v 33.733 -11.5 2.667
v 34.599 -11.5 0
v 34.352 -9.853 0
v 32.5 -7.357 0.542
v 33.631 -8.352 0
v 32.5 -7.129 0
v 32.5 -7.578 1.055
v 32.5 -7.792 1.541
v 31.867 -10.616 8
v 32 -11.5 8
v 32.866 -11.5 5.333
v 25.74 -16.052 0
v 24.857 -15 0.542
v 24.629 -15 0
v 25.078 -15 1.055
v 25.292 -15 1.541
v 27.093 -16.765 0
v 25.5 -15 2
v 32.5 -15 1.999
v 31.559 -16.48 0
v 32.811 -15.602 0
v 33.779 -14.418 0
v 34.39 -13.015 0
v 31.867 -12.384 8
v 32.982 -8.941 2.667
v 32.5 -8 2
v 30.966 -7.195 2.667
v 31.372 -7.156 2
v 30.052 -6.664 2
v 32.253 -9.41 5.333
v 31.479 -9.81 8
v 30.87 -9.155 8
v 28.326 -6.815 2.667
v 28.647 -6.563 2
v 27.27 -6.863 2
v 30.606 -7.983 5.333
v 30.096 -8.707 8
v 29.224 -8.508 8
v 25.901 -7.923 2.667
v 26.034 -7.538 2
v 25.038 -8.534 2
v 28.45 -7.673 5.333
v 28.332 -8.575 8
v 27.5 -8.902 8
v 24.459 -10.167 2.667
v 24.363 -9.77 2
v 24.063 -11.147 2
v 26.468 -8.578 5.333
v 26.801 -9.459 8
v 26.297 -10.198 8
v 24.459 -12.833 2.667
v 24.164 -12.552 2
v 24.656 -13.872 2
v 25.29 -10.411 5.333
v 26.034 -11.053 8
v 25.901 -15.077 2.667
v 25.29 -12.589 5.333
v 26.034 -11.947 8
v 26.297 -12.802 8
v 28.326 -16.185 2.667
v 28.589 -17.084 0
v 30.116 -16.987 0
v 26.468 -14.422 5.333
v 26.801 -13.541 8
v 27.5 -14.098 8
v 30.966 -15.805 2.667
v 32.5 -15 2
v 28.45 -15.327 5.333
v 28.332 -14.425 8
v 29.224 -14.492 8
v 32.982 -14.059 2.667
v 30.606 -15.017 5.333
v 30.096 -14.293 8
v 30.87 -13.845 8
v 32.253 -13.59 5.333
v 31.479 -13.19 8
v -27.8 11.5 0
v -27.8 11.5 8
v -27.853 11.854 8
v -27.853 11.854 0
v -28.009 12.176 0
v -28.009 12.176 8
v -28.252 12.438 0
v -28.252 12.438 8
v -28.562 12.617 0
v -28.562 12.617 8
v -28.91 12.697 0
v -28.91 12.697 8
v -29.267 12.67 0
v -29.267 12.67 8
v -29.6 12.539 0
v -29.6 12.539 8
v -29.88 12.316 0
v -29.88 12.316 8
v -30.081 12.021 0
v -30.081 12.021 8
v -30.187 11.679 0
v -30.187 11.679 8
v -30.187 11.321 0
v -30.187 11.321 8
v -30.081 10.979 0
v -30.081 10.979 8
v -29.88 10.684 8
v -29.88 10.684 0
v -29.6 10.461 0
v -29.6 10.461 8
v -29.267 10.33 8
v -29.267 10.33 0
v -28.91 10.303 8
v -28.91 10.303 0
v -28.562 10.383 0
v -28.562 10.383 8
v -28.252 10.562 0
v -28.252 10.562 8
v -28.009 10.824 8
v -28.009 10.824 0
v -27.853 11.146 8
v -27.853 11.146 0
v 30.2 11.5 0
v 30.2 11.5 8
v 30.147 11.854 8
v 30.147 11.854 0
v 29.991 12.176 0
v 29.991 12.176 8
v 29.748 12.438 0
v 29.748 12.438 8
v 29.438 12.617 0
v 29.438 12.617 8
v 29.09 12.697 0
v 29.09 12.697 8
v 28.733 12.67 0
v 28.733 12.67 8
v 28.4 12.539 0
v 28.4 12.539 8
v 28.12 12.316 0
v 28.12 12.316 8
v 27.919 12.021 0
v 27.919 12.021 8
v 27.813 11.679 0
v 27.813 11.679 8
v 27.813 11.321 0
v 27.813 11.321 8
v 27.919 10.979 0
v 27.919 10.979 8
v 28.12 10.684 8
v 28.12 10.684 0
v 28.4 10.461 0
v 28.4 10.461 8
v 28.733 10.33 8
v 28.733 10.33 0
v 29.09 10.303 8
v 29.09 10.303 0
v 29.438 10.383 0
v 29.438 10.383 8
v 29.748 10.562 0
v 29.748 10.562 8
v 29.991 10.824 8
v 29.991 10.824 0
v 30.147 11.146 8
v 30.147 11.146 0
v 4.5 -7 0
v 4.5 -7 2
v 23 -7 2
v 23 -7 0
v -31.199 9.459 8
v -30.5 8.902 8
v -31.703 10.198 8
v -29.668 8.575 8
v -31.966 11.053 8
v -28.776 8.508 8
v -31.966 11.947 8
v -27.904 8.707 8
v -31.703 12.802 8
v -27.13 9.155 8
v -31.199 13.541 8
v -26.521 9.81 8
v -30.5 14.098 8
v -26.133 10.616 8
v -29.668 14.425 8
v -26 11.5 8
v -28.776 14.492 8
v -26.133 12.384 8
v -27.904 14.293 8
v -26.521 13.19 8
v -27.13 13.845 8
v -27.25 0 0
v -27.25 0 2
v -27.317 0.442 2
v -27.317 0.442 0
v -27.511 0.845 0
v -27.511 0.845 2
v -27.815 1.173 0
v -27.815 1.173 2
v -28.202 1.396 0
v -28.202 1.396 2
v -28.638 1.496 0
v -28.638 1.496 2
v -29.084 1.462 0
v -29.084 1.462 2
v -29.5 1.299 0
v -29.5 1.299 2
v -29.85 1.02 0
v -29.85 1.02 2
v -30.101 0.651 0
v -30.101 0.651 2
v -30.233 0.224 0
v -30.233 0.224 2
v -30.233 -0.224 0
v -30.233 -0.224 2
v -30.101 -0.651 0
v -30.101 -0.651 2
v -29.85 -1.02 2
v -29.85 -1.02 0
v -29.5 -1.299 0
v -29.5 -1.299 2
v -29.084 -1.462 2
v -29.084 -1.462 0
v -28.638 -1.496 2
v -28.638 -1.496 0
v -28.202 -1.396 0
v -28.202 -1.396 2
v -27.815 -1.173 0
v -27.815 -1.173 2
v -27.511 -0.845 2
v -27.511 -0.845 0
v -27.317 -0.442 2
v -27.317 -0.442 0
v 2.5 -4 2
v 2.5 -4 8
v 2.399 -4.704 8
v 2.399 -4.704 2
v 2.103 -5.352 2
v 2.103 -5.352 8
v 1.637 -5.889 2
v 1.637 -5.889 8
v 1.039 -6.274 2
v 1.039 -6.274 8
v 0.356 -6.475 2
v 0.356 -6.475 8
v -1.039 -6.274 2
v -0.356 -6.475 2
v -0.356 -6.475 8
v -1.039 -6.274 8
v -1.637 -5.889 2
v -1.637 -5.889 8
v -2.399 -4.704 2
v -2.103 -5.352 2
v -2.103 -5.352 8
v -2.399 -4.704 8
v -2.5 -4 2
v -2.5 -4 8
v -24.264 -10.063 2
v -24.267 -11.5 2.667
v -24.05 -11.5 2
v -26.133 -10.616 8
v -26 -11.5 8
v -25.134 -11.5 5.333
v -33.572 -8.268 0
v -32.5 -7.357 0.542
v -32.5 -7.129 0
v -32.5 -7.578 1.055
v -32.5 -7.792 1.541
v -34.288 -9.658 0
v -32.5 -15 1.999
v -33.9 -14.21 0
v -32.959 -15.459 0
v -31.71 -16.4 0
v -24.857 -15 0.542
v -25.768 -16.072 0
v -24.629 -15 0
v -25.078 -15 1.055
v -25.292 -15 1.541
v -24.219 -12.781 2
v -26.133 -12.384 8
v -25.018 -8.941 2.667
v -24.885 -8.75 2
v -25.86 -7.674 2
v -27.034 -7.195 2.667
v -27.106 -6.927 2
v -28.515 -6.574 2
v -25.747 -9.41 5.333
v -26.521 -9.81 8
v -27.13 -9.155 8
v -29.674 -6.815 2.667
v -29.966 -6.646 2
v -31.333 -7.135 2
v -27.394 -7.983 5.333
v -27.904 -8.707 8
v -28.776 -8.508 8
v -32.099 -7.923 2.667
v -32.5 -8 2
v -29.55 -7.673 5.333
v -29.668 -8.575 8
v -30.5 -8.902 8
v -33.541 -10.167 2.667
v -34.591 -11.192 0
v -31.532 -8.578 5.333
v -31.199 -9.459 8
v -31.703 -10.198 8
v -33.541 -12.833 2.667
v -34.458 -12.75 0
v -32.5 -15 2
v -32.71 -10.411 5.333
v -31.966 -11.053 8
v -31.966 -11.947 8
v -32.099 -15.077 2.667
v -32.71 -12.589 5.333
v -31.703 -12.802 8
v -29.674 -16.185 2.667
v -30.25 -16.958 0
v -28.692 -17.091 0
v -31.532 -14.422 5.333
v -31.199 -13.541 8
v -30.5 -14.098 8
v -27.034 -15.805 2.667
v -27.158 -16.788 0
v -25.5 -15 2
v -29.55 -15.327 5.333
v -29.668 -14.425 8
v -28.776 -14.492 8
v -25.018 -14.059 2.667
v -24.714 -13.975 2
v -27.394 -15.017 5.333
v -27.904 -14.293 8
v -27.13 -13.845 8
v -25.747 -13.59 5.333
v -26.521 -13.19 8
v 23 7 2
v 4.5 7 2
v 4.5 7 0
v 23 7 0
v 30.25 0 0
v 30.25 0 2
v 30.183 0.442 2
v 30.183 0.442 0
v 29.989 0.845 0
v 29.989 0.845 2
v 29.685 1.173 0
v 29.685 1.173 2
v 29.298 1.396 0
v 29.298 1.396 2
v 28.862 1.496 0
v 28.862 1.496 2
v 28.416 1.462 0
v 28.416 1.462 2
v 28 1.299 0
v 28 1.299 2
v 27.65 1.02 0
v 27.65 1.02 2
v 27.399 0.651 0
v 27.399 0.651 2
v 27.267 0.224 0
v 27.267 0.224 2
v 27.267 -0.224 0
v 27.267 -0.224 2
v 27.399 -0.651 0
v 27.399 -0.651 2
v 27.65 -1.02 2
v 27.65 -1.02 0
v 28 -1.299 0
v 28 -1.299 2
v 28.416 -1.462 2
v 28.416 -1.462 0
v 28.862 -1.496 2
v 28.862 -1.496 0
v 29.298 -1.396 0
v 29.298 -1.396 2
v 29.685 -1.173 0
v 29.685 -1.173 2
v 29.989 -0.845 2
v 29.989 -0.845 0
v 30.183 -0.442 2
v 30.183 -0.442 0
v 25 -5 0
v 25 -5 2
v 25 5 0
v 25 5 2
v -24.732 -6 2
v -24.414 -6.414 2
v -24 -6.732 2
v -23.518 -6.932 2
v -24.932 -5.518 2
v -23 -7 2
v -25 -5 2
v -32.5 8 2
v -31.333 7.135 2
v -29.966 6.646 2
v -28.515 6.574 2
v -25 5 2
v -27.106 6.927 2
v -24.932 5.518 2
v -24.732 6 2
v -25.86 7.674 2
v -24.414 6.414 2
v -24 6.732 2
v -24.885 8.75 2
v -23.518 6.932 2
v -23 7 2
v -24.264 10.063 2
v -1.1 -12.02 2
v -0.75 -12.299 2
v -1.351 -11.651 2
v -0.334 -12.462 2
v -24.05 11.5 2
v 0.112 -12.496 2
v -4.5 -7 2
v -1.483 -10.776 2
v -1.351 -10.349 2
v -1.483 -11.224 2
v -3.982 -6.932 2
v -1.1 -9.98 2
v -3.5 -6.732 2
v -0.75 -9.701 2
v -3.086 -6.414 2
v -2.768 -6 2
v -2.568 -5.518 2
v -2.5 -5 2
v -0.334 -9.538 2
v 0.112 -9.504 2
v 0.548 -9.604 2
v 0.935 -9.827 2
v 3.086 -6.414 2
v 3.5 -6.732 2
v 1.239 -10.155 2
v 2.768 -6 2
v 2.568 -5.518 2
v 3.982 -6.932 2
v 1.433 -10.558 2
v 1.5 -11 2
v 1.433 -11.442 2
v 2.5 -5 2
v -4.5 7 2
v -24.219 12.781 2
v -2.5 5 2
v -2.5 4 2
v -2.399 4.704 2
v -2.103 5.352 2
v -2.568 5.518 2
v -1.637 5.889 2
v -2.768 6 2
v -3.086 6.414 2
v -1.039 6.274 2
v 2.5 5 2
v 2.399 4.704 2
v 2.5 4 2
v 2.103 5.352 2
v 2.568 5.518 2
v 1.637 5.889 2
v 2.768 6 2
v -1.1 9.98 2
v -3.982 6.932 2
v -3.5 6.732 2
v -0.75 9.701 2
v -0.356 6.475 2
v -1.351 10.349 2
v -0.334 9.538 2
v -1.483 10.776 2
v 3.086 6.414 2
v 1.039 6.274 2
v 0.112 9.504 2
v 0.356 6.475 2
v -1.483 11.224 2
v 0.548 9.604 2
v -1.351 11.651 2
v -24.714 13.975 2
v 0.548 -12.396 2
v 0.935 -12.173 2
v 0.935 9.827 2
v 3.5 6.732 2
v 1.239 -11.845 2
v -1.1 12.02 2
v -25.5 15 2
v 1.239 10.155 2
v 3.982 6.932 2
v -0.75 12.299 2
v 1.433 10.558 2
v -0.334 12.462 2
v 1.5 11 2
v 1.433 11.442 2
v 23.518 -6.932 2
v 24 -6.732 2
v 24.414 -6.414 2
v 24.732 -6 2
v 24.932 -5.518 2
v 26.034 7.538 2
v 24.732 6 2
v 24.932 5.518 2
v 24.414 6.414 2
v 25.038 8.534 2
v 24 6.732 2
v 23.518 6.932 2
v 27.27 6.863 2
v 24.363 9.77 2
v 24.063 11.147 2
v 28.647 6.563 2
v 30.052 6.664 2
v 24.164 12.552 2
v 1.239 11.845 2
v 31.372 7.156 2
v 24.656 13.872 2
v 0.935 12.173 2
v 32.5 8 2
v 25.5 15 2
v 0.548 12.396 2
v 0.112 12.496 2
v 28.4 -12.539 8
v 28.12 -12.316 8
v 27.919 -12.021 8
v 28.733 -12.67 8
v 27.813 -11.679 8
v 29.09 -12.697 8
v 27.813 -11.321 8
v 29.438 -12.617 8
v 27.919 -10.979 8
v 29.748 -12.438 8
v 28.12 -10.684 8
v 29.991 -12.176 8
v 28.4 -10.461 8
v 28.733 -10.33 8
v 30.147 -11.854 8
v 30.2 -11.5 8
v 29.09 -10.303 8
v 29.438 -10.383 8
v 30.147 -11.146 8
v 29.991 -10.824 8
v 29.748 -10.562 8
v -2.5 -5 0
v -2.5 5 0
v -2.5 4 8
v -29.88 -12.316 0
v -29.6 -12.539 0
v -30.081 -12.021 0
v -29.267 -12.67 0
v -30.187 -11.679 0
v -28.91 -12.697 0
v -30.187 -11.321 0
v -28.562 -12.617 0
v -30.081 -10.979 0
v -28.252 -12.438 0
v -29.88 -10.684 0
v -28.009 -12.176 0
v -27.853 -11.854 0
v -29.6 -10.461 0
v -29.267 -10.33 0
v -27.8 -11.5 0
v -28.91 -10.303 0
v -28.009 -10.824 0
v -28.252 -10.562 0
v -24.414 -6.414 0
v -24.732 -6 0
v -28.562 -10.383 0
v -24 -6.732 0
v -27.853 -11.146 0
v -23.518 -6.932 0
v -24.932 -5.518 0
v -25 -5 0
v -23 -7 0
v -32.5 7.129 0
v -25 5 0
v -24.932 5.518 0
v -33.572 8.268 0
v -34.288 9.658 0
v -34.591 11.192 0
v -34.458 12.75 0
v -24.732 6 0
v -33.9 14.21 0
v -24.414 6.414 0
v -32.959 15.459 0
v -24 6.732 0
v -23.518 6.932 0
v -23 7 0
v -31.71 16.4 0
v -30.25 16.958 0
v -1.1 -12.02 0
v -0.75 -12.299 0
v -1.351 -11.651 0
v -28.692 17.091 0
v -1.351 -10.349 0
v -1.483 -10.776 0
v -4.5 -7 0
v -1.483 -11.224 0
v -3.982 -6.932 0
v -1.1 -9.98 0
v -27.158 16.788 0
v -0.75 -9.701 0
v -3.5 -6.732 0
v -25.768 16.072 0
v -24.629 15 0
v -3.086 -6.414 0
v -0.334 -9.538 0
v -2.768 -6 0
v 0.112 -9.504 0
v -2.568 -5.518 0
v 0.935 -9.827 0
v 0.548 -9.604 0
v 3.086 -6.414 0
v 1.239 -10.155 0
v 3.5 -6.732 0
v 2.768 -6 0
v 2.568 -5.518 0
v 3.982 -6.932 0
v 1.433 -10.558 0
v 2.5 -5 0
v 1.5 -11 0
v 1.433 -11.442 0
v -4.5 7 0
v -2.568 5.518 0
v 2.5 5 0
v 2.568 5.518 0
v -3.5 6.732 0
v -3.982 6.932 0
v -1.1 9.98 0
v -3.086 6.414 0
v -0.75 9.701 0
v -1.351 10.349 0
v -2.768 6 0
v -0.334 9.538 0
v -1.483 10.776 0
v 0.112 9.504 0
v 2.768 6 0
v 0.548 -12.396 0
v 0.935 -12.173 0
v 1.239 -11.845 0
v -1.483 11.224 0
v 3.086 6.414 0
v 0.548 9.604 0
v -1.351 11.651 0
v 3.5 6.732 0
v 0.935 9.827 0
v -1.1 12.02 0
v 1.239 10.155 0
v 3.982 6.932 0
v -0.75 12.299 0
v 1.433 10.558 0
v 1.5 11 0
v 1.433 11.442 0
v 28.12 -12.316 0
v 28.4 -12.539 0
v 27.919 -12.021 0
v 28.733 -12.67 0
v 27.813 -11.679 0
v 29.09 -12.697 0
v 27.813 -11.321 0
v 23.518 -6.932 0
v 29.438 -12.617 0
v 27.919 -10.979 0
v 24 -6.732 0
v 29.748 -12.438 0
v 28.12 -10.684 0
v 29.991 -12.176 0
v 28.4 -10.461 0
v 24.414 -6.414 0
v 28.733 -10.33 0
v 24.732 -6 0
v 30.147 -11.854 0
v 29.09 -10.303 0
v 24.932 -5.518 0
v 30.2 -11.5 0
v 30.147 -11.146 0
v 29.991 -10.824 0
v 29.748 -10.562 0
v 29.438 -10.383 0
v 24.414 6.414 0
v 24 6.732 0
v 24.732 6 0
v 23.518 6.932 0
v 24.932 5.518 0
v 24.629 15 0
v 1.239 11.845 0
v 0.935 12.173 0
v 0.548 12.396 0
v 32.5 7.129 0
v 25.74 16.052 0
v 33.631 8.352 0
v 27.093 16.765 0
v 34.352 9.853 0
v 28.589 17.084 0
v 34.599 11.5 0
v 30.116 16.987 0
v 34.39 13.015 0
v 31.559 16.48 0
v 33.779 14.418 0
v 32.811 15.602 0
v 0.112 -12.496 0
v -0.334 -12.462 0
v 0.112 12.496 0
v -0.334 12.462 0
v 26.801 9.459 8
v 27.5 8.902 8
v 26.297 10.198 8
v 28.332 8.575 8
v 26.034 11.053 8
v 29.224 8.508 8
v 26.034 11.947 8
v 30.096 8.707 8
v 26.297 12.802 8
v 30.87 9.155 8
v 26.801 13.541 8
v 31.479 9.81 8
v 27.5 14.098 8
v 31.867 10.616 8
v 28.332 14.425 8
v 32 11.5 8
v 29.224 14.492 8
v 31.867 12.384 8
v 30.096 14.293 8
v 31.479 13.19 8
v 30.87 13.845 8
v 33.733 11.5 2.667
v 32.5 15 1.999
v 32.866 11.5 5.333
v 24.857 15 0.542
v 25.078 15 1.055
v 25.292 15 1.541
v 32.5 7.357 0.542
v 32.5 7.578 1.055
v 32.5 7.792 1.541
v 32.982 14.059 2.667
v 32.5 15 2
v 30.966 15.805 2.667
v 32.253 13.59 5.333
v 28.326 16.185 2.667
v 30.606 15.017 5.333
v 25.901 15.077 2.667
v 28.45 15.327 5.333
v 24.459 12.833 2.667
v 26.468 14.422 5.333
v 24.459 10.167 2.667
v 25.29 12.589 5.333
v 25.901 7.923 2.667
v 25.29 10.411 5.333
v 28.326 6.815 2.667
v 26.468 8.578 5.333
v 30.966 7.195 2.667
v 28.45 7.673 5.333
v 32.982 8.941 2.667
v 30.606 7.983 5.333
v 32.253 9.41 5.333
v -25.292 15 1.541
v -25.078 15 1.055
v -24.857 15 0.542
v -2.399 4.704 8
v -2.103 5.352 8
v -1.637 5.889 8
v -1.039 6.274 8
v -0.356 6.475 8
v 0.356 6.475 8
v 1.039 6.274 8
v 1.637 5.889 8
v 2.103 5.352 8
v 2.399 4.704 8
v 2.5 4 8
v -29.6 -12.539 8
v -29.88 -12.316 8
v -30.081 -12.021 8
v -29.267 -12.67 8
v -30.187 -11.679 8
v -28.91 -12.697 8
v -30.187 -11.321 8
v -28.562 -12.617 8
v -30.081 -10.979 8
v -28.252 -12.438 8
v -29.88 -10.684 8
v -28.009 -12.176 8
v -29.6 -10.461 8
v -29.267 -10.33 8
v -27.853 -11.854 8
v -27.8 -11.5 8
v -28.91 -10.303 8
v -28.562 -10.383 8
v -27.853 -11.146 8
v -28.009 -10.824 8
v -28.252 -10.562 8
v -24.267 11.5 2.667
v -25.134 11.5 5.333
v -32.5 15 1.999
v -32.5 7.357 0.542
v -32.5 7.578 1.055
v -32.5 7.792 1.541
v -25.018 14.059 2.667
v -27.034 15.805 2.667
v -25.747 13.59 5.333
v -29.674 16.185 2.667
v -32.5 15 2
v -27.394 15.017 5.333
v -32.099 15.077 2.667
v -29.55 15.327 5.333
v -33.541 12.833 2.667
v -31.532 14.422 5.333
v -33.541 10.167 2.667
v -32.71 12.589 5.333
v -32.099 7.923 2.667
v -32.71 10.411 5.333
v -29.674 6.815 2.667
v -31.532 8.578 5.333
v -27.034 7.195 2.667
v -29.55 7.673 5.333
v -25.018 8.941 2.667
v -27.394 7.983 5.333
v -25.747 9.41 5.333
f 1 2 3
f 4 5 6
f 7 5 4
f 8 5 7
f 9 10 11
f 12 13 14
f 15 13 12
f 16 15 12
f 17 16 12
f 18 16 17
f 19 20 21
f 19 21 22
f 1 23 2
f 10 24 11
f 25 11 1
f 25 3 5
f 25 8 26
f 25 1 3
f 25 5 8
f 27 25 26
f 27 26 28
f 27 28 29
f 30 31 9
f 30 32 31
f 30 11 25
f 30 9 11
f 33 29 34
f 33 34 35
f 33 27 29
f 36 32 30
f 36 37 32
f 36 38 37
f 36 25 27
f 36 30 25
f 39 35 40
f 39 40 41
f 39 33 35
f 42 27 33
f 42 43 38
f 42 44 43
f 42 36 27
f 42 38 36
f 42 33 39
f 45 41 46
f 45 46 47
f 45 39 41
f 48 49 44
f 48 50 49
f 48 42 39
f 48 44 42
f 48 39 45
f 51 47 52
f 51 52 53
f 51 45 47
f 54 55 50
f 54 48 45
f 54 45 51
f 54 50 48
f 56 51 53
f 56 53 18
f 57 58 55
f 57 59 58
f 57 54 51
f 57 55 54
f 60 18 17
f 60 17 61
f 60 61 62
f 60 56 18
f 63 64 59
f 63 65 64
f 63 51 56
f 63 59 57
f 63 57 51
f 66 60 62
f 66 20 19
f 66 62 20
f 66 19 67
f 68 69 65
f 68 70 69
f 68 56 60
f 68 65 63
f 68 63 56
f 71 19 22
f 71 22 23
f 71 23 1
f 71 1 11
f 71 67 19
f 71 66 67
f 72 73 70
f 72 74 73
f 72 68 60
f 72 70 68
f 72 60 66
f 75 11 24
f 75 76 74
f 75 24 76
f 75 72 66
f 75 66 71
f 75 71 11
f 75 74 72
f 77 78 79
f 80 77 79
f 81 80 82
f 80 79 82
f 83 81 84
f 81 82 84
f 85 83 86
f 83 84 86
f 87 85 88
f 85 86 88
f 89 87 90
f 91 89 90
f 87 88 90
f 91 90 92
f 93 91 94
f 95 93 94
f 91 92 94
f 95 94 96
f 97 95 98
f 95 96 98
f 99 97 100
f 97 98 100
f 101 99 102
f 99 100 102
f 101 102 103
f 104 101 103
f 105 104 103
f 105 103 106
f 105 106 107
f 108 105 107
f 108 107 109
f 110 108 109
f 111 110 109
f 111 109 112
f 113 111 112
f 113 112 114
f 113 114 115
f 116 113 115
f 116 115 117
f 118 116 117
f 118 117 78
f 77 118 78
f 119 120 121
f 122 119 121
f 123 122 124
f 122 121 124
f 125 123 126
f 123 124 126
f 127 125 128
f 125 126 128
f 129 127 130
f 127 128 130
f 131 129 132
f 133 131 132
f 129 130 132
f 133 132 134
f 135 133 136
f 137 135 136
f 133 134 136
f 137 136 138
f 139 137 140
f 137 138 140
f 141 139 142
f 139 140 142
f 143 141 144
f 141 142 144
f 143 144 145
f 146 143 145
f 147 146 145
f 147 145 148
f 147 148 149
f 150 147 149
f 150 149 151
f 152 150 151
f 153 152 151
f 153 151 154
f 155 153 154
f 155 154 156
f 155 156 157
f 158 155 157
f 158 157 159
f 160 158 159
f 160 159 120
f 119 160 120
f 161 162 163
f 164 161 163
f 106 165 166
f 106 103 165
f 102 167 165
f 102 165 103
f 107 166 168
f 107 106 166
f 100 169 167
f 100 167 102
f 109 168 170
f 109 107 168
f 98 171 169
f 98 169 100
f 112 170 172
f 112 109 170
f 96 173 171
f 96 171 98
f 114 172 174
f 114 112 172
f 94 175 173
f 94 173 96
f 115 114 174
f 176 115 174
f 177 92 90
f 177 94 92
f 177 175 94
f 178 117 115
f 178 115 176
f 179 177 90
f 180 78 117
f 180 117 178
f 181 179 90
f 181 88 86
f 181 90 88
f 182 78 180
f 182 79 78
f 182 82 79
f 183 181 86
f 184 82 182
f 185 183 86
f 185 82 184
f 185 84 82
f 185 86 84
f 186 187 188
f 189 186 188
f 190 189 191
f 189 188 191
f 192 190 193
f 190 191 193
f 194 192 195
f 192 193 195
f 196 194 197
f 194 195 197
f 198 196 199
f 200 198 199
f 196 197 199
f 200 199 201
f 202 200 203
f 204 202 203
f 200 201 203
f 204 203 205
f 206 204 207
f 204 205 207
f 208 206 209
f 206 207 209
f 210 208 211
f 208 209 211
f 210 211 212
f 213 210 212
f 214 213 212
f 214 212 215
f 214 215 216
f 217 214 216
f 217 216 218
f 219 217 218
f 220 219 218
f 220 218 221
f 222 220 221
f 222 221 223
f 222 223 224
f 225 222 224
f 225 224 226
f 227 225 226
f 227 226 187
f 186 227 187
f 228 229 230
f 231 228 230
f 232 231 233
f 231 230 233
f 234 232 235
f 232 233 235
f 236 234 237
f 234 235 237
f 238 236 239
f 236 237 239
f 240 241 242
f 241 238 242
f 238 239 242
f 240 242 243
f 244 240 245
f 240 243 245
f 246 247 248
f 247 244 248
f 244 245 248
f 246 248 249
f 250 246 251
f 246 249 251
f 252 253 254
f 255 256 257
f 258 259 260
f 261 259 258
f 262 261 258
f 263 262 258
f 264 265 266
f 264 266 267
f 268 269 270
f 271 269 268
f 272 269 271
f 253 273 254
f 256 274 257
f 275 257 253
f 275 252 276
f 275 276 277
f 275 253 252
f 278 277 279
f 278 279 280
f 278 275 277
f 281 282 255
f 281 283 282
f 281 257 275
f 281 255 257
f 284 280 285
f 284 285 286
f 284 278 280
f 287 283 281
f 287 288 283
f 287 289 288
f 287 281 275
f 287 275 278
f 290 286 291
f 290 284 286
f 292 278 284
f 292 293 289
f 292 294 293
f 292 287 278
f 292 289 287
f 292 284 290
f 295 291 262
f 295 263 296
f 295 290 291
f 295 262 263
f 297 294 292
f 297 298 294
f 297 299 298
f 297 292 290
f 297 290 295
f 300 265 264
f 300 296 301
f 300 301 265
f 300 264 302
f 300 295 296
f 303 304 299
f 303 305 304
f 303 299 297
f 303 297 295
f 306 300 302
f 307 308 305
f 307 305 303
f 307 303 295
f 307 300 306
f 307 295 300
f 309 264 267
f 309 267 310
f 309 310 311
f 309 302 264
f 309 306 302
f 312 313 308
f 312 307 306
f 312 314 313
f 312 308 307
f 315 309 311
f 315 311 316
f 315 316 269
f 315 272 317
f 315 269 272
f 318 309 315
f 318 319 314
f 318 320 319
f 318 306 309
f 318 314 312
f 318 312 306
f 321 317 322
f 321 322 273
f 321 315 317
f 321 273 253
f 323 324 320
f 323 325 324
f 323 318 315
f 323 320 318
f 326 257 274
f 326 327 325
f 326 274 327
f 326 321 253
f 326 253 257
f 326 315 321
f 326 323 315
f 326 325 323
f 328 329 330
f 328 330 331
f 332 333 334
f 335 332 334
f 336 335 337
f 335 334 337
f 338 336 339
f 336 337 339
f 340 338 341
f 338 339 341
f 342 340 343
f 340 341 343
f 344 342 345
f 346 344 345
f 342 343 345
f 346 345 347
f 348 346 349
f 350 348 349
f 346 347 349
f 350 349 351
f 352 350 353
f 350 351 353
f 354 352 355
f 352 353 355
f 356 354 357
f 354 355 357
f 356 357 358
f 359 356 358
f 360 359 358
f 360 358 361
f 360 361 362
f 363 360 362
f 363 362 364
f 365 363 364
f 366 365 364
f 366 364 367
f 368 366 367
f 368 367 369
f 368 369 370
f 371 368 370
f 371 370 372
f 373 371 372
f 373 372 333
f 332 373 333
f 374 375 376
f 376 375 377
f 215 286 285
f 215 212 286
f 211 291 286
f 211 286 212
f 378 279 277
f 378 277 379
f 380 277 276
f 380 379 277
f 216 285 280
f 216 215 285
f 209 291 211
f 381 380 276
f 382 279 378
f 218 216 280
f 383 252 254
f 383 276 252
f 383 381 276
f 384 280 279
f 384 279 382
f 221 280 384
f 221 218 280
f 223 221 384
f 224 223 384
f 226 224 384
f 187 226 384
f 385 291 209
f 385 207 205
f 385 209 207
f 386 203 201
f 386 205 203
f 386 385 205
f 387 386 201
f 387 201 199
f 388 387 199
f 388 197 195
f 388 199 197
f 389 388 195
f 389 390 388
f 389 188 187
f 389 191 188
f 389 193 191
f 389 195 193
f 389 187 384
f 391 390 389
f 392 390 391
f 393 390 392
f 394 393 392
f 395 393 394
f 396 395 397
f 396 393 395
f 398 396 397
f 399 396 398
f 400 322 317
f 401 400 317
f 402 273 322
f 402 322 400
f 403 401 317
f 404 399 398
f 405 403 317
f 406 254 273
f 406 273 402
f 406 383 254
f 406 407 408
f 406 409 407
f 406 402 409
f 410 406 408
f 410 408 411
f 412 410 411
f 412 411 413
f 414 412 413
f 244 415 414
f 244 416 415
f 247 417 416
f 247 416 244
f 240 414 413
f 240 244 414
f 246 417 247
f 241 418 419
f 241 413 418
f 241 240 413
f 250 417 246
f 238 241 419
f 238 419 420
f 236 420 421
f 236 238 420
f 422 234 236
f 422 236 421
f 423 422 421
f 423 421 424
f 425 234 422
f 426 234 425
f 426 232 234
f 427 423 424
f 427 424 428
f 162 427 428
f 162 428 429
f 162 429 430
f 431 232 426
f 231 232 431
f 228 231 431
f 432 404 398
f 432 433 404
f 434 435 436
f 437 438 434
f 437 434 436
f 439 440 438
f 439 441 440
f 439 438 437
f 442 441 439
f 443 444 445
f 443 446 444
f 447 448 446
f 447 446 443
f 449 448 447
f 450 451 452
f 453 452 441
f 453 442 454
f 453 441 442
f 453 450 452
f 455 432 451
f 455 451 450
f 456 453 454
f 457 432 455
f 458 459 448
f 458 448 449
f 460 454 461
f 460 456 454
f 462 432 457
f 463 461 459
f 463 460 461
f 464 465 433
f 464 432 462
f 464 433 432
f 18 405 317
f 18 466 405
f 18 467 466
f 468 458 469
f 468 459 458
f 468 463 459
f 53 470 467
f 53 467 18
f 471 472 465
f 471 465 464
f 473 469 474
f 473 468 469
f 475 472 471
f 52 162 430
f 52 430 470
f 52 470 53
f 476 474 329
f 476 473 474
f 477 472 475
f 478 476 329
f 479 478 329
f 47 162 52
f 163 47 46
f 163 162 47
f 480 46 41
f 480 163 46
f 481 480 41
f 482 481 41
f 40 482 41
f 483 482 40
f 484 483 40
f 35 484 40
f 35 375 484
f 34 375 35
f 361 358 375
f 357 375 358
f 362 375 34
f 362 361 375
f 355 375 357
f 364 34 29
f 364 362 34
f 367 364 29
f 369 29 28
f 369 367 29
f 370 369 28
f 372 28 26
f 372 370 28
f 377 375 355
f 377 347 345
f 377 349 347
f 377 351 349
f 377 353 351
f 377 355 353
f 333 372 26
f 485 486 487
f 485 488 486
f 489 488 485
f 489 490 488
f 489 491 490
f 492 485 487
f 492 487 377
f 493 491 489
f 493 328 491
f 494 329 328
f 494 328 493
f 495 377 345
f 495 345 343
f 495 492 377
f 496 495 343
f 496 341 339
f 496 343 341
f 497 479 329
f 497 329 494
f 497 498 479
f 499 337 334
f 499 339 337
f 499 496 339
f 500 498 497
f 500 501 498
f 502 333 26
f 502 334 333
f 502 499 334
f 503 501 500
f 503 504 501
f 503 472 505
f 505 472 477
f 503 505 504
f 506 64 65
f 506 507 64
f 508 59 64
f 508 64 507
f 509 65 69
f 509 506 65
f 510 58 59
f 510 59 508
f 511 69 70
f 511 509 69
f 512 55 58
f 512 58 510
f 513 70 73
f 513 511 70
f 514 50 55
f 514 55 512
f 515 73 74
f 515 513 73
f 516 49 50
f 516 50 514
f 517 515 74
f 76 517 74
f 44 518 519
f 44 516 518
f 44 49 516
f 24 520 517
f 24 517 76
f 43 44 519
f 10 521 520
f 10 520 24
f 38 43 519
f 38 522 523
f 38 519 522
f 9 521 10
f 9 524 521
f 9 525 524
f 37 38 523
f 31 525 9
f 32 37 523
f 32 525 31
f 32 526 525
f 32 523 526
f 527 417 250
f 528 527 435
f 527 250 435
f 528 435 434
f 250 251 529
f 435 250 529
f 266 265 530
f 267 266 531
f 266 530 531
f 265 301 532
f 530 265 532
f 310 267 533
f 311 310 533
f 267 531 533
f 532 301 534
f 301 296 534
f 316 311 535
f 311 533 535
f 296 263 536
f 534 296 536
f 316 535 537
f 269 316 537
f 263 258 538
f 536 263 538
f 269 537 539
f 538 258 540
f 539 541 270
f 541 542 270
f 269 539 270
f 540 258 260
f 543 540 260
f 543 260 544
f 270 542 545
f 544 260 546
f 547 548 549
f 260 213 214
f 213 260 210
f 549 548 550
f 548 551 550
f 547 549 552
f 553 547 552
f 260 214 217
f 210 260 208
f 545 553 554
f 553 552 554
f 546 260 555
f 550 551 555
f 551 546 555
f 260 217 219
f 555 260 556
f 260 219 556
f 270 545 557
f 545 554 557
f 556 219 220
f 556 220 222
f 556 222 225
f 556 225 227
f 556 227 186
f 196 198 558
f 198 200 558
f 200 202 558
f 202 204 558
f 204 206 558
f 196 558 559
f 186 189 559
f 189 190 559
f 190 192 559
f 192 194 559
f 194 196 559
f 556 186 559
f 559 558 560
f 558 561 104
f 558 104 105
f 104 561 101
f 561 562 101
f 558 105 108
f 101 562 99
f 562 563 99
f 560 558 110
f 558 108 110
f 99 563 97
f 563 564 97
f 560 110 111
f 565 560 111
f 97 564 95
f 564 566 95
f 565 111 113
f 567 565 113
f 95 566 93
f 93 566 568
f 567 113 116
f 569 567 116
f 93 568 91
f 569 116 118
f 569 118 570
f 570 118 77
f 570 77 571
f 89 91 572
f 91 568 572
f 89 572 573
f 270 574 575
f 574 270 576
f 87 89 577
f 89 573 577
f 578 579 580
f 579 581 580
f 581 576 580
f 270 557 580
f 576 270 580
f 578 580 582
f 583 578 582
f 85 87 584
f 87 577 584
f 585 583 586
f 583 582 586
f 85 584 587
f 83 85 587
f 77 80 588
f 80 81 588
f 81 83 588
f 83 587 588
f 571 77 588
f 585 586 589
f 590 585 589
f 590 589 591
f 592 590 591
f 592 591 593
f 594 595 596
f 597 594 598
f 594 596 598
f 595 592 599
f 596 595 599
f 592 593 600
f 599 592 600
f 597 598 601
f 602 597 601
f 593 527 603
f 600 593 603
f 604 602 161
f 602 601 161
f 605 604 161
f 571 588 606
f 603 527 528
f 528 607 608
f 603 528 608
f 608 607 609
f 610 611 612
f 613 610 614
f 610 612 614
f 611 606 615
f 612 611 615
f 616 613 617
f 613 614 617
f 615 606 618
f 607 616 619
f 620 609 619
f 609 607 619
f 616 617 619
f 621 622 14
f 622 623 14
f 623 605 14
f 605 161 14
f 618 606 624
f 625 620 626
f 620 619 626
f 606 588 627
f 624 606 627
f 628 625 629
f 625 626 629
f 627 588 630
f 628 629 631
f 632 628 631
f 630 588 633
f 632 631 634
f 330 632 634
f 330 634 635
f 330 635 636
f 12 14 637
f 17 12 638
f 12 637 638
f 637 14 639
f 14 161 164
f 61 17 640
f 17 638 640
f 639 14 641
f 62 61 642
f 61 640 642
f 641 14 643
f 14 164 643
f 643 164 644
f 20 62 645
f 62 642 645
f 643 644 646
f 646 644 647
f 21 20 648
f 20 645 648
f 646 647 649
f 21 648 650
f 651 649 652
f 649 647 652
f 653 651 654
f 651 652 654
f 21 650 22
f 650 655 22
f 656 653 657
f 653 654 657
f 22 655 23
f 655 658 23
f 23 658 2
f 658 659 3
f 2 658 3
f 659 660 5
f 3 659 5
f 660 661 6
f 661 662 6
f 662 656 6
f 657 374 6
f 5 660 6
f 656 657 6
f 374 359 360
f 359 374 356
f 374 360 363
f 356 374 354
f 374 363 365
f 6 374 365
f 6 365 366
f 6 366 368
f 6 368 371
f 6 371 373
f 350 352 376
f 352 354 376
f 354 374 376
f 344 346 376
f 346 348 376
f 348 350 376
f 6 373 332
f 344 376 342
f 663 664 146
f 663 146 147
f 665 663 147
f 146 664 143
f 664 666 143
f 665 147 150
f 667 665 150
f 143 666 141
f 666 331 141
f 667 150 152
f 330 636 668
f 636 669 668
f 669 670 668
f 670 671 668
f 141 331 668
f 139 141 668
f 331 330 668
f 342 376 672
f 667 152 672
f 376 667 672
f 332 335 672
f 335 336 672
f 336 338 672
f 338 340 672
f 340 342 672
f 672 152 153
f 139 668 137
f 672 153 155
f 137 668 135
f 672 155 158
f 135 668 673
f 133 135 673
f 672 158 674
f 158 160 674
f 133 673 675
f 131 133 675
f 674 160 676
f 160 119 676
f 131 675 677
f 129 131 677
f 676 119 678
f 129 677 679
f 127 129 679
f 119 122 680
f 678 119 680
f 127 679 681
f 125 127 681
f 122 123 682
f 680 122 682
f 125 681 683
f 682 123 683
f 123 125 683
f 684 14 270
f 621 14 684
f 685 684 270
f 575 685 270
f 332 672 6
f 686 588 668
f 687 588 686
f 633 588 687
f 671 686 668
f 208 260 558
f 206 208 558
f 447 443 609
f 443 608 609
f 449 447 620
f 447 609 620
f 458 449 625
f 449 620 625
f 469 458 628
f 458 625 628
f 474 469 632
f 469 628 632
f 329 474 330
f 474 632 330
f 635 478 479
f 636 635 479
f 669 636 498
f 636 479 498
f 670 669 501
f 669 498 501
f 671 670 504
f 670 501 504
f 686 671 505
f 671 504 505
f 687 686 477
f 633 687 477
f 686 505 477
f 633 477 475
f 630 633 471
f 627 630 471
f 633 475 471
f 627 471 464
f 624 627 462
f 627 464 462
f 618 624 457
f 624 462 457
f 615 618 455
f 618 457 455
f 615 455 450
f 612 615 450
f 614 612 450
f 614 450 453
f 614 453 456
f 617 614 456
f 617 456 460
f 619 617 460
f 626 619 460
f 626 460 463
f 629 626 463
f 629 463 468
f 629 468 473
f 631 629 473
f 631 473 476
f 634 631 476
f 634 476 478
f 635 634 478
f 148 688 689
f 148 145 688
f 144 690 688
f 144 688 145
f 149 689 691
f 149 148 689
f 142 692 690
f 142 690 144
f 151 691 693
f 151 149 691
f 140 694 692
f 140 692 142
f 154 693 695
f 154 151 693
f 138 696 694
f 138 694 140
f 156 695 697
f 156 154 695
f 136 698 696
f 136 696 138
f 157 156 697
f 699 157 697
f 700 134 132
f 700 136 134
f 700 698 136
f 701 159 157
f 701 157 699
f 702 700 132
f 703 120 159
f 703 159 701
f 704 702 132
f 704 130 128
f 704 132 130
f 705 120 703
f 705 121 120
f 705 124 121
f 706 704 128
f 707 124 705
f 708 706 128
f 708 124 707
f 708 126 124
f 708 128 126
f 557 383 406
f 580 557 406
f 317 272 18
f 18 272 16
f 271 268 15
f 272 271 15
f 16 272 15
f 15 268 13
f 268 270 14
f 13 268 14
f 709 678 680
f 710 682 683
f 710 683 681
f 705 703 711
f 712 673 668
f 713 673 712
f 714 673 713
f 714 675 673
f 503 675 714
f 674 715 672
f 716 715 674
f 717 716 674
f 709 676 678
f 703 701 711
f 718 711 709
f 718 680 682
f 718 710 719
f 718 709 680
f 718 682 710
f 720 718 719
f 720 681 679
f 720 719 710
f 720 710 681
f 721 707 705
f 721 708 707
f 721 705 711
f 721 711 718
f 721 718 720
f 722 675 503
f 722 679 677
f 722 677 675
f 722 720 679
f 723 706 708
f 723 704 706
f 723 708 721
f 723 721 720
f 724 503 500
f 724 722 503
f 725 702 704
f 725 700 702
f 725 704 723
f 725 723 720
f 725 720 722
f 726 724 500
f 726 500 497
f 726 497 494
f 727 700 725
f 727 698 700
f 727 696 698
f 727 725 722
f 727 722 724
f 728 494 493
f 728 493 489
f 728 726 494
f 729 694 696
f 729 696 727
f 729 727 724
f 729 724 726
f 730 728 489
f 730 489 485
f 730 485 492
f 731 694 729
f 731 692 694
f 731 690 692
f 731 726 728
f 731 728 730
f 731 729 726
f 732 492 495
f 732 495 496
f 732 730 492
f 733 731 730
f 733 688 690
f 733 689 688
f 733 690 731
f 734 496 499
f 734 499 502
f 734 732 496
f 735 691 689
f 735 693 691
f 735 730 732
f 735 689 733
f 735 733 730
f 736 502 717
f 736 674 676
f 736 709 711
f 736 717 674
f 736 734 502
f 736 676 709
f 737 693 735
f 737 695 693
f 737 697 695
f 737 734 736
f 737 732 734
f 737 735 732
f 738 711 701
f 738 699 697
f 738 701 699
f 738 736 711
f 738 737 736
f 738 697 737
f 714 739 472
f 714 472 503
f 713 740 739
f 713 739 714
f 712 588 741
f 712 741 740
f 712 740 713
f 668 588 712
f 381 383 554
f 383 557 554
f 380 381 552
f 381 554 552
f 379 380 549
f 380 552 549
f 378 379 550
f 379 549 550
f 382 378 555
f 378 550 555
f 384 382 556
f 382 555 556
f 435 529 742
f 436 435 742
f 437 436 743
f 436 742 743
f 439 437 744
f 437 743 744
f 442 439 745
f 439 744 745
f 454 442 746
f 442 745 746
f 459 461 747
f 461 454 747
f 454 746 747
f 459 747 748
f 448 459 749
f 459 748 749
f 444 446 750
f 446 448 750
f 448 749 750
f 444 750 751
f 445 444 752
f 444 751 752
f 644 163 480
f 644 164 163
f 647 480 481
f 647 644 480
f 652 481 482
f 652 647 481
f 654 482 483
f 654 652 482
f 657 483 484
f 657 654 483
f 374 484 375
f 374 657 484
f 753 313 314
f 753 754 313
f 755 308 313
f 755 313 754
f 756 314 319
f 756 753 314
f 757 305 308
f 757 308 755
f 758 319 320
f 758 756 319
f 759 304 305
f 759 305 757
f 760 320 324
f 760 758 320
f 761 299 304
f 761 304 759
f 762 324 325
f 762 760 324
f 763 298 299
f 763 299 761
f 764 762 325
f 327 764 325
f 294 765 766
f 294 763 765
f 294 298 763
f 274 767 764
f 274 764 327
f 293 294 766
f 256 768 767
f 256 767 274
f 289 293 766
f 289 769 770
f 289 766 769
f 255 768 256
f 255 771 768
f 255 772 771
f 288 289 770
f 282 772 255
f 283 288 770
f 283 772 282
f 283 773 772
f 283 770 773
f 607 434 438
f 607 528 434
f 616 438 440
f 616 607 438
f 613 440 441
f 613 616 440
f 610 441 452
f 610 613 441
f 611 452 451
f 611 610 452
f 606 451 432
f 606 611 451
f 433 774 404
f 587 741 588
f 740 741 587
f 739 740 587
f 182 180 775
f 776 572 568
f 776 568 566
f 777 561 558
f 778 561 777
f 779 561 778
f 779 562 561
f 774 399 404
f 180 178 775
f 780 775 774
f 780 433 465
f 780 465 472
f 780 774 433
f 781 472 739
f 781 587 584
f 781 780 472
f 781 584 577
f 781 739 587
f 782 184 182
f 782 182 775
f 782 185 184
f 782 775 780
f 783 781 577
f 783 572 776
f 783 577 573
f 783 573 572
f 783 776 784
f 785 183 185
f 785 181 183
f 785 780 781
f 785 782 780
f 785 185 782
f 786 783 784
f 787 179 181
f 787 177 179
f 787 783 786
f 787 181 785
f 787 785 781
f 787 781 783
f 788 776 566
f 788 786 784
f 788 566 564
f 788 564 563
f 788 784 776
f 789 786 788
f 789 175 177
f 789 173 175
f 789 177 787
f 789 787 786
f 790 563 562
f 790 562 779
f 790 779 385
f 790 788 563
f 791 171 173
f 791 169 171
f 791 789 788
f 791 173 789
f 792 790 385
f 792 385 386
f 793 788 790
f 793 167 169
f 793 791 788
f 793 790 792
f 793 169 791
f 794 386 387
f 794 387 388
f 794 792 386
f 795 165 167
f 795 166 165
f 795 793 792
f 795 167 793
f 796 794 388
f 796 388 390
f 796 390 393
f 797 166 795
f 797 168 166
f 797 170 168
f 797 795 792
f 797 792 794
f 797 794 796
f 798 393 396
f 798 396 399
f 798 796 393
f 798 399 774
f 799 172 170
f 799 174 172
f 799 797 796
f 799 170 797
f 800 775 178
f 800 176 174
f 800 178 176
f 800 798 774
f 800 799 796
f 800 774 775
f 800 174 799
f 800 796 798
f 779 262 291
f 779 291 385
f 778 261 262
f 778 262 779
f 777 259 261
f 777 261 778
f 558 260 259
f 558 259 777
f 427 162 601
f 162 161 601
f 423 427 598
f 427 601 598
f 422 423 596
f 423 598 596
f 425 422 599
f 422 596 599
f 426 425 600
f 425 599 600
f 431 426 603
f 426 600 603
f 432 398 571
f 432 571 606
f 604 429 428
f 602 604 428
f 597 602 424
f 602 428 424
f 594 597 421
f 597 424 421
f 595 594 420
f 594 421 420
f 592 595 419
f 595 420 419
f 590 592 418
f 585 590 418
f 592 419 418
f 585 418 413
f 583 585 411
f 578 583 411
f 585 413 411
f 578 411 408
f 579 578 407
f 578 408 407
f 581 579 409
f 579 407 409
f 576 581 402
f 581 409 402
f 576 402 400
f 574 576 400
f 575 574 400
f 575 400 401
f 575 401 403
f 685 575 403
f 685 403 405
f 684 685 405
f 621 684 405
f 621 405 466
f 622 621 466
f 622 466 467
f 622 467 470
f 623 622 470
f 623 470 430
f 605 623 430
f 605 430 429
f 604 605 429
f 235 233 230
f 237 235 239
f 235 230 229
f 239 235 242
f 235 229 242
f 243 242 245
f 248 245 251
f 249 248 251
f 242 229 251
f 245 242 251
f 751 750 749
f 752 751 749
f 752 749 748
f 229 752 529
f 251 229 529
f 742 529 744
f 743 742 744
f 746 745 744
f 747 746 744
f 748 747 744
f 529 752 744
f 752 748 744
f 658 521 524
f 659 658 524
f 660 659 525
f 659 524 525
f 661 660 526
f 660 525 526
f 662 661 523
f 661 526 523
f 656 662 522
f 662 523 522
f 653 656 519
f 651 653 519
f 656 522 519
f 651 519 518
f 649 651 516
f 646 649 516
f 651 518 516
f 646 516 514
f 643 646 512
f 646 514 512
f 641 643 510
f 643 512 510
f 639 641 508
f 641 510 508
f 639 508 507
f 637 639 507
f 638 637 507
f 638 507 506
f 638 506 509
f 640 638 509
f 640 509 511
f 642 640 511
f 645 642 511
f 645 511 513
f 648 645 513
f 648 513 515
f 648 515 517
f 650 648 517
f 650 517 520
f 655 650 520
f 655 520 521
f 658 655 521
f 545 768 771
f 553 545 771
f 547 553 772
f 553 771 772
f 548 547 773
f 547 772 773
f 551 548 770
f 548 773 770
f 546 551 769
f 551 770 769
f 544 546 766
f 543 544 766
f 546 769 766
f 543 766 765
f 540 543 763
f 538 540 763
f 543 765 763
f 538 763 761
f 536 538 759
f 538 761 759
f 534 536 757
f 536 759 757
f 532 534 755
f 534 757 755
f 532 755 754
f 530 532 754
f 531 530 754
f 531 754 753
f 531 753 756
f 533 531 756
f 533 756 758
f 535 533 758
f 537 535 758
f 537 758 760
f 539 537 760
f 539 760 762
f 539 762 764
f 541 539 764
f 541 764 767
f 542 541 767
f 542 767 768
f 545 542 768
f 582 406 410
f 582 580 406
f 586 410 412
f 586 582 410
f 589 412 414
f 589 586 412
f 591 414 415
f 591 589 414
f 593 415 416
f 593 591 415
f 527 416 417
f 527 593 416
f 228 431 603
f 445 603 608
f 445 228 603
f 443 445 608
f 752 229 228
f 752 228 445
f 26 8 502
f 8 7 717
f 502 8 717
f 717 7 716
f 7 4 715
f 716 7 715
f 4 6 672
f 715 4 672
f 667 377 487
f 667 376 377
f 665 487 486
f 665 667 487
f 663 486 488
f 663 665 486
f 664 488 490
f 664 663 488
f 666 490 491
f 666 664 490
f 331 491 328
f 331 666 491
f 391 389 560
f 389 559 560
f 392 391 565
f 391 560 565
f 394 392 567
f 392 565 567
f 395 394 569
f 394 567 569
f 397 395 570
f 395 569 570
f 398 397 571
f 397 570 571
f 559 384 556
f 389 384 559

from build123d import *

# Parameters (mm, degrees)
ESQUISSE1_W                  = 65
ESQUISSE1_H                  = 30
BOSS_EXTRU_1_DEPTH           = 2
ESQUISSE2_R                  = 3
BOSS_EXTRU_2_DEPTH           = 8
BOSS_EXTRU_2_DRAFT           = 18
BOSS_EXTRU_2_PROFILE_2_DEPTH = 8
BOSS_EXTRU_2_PROFILE_2_DRAFT = 18
BOSS_EXTRU_2_PROFILE_3_DEPTH = 8
BOSS_EXTRU_2_PROFILE_3_DRAFT = 18
BOSS_EXTRU_2_PROFILE_4_DEPTH = 8
BOSS_EXTRU_2_PROFILE_4_DRAFT = 18
ENL_V_MAT_EXTRU_2_REACH      = 41.058
ESQUISSE4_W                  = 22.5
ESQUISSE4_H                  = 14
ENL_V_MAT_EXTRU_3_REACH      = 41.058
ESQUISSE5_R                  = 1.5
CONG_1_R                     = 2
BOSS_EXTRU_3_REACH           = 41.415
ENL_V_MAT_EXTRU_4_REACH      = 41.415
ESQUISSE7_R                  = 1.2


with BuildPart() as part:
    # Esquisse1 → Boss.-Extru.1 (new body)
    with BuildSketch(Plane.XY):
        Rectangle(ESQUISSE1_W, ESQUISSE1_H)
    extrude(amount=BOSS_EXTRU_1_DEPTH)


with BuildPart() as boss_extru_2_tool:
    # Esquisse2 → Boss.-Extru.2 (with draft: the straight prism first)
    with BuildSketch(Plane.XY.offset(8)):
        with Locations((-29, 11.5)):
            Circle(ESQUISSE2_R)
    extrude(amount=-BOSS_EXTRU_2_DEPTH)
    # Boss.-Extru.2: the draft: its side faces are tilted about the plane it starts from
    boss_extru_2_sides = [boss_extru_2_tool.faces().sort_by_distance(p)[0] for p in [
        (-32, 11.5, 4),
    ]]
    draft(boss_extru_2_sides, Plane.XY.offset(8), BOSS_EXTRU_2_DRAFT)


with BuildPart() as part_1:
    add(part.part)

    # Boss.-Extru.2: add boss_extru_2_tool
    add(boss_extru_2_tool.part)


with BuildPart() as boss_extru_2_profile_2_tool:
    # Esquisse2 → Boss.-Extru.2 profile 2 (with draft: the straight prism first)
    with BuildSketch(Plane.XY.offset(8)):
        with Locations((29, 11.5)):
            Circle(ESQUISSE2_R)
    extrude(amount=-BOSS_EXTRU_2_PROFILE_2_DEPTH)
    # Boss.-Extru.2 profile 2: the draft: its side faces are tilted about the plane it starts from
    boss_extru_2_profile_2_sides = [boss_extru_2_profile_2_tool.faces().sort_by_distance(p)[0] for p in [
        (26, 11.5, 4),
    ]]
    draft(boss_extru_2_profile_2_sides, Plane.XY.offset(8), BOSS_EXTRU_2_PROFILE_2_DRAFT)


with BuildPart() as part_2:
    add(part_1.part)

    # Boss.-Extru.2 profile 2: add boss_extru_2_profile_2_tool
    add(boss_extru_2_profile_2_tool.part)


with BuildPart() as boss_extru_2_profile_3_tool:
    # Esquisse2 → Boss.-Extru.2 profile 3 (with draft: the straight prism first)
    with BuildSketch(Plane.XY.offset(8)):
        with Locations((29, -11.5)):
            Circle(ESQUISSE2_R)
    extrude(amount=-BOSS_EXTRU_2_PROFILE_3_DEPTH)
    # Boss.-Extru.2 profile 3: the draft: its side faces are tilted about the plane it starts from
    boss_extru_2_profile_3_sides = [boss_extru_2_profile_3_tool.faces().sort_by_distance(p)[0] for p in [
        (26, -11.5, 4),
    ]]
    draft(boss_extru_2_profile_3_sides, Plane.XY.offset(8), BOSS_EXTRU_2_PROFILE_3_DRAFT)


with BuildPart() as part_3:
    add(part_2.part)

    # Boss.-Extru.2 profile 3: add boss_extru_2_profile_3_tool
    add(boss_extru_2_profile_3_tool.part)


with BuildPart() as boss_extru_2_profile_4_tool:
    # Esquisse2 → Boss.-Extru.2 profile 4 (with draft: the straight prism first)
    with BuildSketch(Plane.XY.offset(8)):
        with Locations((-29, -11.5)):
            Circle(ESQUISSE2_R)
    extrude(amount=-BOSS_EXTRU_2_PROFILE_4_DEPTH)
    # Boss.-Extru.2 profile 4: the draft: its side faces are tilted about the plane it starts from
    boss_extru_2_profile_4_sides = [boss_extru_2_profile_4_tool.faces().sort_by_distance(p)[0] for p in [
        (-32, -11.5, 4),
    ]]
    draft(boss_extru_2_profile_4_sides, Plane.XY.offset(8), BOSS_EXTRU_2_PROFILE_4_DRAFT)


with BuildPart() as part_4:
    add(part_3.part)

    # Boss.-Extru.2 profile 4: add boss_extru_2_profile_4_tool
    add(boss_extru_2_profile_4_tool.part)

    # Esquisse4 → Enlèv. mat.-Extru.2 (cut, up to next)
    with BuildSketch(Plane.XY.offset(2), mode=Mode.PRIVATE) as enl_v_mat_extru_2_sk1:
        with Locations((13.75, 0)):
            Rectangle(ESQUISSE4_W, ESQUISSE4_H)
    enl_v_mat_extru_2_tool1 = extrude(enl_v_mat_extru_2_sk1.sketch, amount=-ENL_V_MAT_EXTRU_2_REACH, mode=Mode.PRIVATE) & part_4.part
    # Esquisse4 → Enlèv. mat.-Extru.2 (cut, up to next)
    with BuildSketch(Plane.XY.offset(2), mode=Mode.PRIVATE) as enl_v_mat_extru_2_sk2:
        with Locations((-13.75, 0)):
            Rectangle(ESQUISSE4_W, ESQUISSE4_H)
    enl_v_mat_extru_2_tool2 = extrude(enl_v_mat_extru_2_sk2.sketch, amount=-ENL_V_MAT_EXTRU_2_REACH, mode=Mode.PRIVATE) & part_4.part
    add(enl_v_mat_extru_2_tool1.solids().sort_by_distance((13.75, 0, 2))[0], mode=Mode.SUBTRACT)
    add(enl_v_mat_extru_2_tool2.solids().sort_by_distance((-13.75, 0, 2))[0], mode=Mode.SUBTRACT)

    # Esquisse5 → Enlèv. mat.-Extru.3 (cut, up to next)
    with BuildSketch(Plane.XY.offset(2), mode=Mode.PRIVATE) as enl_v_mat_extru_3_sk1:
        with Locations((-28.75, 0)):
            Circle(ESQUISSE5_R)
    enl_v_mat_extru_3_tool1 = extrude(enl_v_mat_extru_3_sk1.sketch, amount=-ENL_V_MAT_EXTRU_3_REACH, mode=Mode.PRIVATE) & part_4.part
    # Esquisse5 → Enlèv. mat.-Extru.3 (cut, up to next)
    with BuildSketch(Plane.XY.offset(2), mode=Mode.PRIVATE) as enl_v_mat_extru_3_sk2:
        with Locations((0, 11)):
            Circle(ESQUISSE5_R)
    enl_v_mat_extru_3_tool2 = extrude(enl_v_mat_extru_3_sk2.sketch, amount=-ENL_V_MAT_EXTRU_3_REACH, mode=Mode.PRIVATE) & part_4.part
    # Esquisse5 → Enlèv. mat.-Extru.3 (cut, up to next)
    with BuildSketch(Plane.XY.offset(2), mode=Mode.PRIVATE) as enl_v_mat_extru_3_sk3:
        with Locations((0, -11)):
            Circle(ESQUISSE5_R)
    enl_v_mat_extru_3_tool3 = extrude(enl_v_mat_extru_3_sk3.sketch, amount=-ENL_V_MAT_EXTRU_3_REACH, mode=Mode.PRIVATE) & part_4.part
    # Esquisse5 → Enlèv. mat.-Extru.3 (cut, up to next)
    with BuildSketch(Plane.XY.offset(2), mode=Mode.PRIVATE) as enl_v_mat_extru_3_sk4:
        with Locations((28.75, 0)):
            Circle(ESQUISSE5_R)
    enl_v_mat_extru_3_tool4 = extrude(enl_v_mat_extru_3_sk4.sketch, amount=-ENL_V_MAT_EXTRU_3_REACH, mode=Mode.PRIVATE) & part_4.part
    add(enl_v_mat_extru_3_tool1.solids().sort_by_distance((-28.75, 0, 2))[0], mode=Mode.SUBTRACT)
    add(enl_v_mat_extru_3_tool2.solids().sort_by_distance((0, 11, 2))[0], mode=Mode.SUBTRACT)
    add(enl_v_mat_extru_3_tool3.solids().sort_by_distance((0, -11, 2))[0], mode=Mode.SUBTRACT)
    add(enl_v_mat_extru_3_tool4.solids().sort_by_distance((28.75, 0, 2))[0], mode=Mode.SUBTRACT)

    # Congé1
    cong_1_edges = [part_4.edges().sort_by_distance(p)[0] for p in [
        (-2.5, 7, 1),
        (-2.5, -7, 1),
        (-25, -7, 1),
        (-25, 7, 1),
        (25, 7, 1),
        (25, -7, 1),
        (2.5, -7, 1),
        (2.5, 7, 1),
    ]]
    fillet(cong_1_edges, radius=CONG_1_R)

    # Esquisse6 → Boss.-Extru.3 (add, up to next)
    with BuildSketch(Plane.XY.offset(8), mode=Mode.PRIVATE) as boss_extru_3_sk1:
        with BuildLine():
            Line((-2.5, -4), (-2.5, 4))
            ThreePointArc((-2.5, 4), (0, 6.5), (2.5, 4))
            Line((2.5, 4), (2.5, -4))
            ThreePointArc((2.5, -4), (0, -6.5), (-2.5, -4))
        make_face()
    boss_extru_3_tool1 = extrude(boss_extru_3_sk1.sketch, amount=-BOSS_EXTRU_3_REACH, mode=Mode.PRIVATE) - part_4.part
    add(boss_extru_3_tool1.solids().sort_by_distance((0, 0, 8))[0])

    # Esquisse7 → Enlèv. mat.-Extru.4 (cut, up to next)
    with BuildSketch(Plane.XY.offset(8), mode=Mode.PRIVATE) as enl_v_mat_extru_4_sk1:
        with Locations((-29, 11.5)):
            Circle(ESQUISSE7_R)
    enl_v_mat_extru_4_tool1 = extrude(enl_v_mat_extru_4_sk1.sketch, amount=-ENL_V_MAT_EXTRU_4_REACH, mode=Mode.PRIVATE) & part_4.part
    # Esquisse7 → Enlèv. mat.-Extru.4 (cut, up to next)
    with BuildSketch(Plane.XY.offset(8), mode=Mode.PRIVATE) as enl_v_mat_extru_4_sk2:
        with Locations((29, 11.5)):
            Circle(ESQUISSE7_R)
    enl_v_mat_extru_4_tool2 = extrude(enl_v_mat_extru_4_sk2.sketch, amount=-ENL_V_MAT_EXTRU_4_REACH, mode=Mode.PRIVATE) & part_4.part
    # Esquisse7 → Enlèv. mat.-Extru.4 (cut, up to next)
    with BuildSketch(Plane.XY.offset(8), mode=Mode.PRIVATE) as enl_v_mat_extru_4_sk3:
        with Locations((29, -11.5)):
            Circle(ESQUISSE7_R)
    enl_v_mat_extru_4_tool3 = extrude(enl_v_mat_extru_4_sk3.sketch, amount=-ENL_V_MAT_EXTRU_4_REACH, mode=Mode.PRIVATE) & part_4.part
    # Esquisse7 → Enlèv. mat.-Extru.4 (cut, up to next)
    with BuildSketch(Plane.XY.offset(8), mode=Mode.PRIVATE) as enl_v_mat_extru_4_sk4:
        with Locations((-29, -11.5)):
            Circle(ESQUISSE7_R)
    enl_v_mat_extru_4_tool4 = extrude(enl_v_mat_extru_4_sk4.sketch, amount=-ENL_V_MAT_EXTRU_4_REACH, mode=Mode.PRIVATE) & part_4.part
    add(enl_v_mat_extru_4_tool1.solids().sort_by_distance((-29, 11.5, 8))[0], mode=Mode.SUBTRACT)
    add(enl_v_mat_extru_4_tool2.solids().sort_by_distance((29, 11.5, 8))[0], mode=Mode.SUBTRACT)
    add(enl_v_mat_extru_4_tool3.solids().sort_by_distance((29, -11.5, 8))[0], mode=Mode.SUBTRACT)
    add(enl_v_mat_extru_4_tool4.solids().sort_by_distance((-29, -11.5, 8))[0], mode=Mode.SUBTRACT)


solid = part_4.part
